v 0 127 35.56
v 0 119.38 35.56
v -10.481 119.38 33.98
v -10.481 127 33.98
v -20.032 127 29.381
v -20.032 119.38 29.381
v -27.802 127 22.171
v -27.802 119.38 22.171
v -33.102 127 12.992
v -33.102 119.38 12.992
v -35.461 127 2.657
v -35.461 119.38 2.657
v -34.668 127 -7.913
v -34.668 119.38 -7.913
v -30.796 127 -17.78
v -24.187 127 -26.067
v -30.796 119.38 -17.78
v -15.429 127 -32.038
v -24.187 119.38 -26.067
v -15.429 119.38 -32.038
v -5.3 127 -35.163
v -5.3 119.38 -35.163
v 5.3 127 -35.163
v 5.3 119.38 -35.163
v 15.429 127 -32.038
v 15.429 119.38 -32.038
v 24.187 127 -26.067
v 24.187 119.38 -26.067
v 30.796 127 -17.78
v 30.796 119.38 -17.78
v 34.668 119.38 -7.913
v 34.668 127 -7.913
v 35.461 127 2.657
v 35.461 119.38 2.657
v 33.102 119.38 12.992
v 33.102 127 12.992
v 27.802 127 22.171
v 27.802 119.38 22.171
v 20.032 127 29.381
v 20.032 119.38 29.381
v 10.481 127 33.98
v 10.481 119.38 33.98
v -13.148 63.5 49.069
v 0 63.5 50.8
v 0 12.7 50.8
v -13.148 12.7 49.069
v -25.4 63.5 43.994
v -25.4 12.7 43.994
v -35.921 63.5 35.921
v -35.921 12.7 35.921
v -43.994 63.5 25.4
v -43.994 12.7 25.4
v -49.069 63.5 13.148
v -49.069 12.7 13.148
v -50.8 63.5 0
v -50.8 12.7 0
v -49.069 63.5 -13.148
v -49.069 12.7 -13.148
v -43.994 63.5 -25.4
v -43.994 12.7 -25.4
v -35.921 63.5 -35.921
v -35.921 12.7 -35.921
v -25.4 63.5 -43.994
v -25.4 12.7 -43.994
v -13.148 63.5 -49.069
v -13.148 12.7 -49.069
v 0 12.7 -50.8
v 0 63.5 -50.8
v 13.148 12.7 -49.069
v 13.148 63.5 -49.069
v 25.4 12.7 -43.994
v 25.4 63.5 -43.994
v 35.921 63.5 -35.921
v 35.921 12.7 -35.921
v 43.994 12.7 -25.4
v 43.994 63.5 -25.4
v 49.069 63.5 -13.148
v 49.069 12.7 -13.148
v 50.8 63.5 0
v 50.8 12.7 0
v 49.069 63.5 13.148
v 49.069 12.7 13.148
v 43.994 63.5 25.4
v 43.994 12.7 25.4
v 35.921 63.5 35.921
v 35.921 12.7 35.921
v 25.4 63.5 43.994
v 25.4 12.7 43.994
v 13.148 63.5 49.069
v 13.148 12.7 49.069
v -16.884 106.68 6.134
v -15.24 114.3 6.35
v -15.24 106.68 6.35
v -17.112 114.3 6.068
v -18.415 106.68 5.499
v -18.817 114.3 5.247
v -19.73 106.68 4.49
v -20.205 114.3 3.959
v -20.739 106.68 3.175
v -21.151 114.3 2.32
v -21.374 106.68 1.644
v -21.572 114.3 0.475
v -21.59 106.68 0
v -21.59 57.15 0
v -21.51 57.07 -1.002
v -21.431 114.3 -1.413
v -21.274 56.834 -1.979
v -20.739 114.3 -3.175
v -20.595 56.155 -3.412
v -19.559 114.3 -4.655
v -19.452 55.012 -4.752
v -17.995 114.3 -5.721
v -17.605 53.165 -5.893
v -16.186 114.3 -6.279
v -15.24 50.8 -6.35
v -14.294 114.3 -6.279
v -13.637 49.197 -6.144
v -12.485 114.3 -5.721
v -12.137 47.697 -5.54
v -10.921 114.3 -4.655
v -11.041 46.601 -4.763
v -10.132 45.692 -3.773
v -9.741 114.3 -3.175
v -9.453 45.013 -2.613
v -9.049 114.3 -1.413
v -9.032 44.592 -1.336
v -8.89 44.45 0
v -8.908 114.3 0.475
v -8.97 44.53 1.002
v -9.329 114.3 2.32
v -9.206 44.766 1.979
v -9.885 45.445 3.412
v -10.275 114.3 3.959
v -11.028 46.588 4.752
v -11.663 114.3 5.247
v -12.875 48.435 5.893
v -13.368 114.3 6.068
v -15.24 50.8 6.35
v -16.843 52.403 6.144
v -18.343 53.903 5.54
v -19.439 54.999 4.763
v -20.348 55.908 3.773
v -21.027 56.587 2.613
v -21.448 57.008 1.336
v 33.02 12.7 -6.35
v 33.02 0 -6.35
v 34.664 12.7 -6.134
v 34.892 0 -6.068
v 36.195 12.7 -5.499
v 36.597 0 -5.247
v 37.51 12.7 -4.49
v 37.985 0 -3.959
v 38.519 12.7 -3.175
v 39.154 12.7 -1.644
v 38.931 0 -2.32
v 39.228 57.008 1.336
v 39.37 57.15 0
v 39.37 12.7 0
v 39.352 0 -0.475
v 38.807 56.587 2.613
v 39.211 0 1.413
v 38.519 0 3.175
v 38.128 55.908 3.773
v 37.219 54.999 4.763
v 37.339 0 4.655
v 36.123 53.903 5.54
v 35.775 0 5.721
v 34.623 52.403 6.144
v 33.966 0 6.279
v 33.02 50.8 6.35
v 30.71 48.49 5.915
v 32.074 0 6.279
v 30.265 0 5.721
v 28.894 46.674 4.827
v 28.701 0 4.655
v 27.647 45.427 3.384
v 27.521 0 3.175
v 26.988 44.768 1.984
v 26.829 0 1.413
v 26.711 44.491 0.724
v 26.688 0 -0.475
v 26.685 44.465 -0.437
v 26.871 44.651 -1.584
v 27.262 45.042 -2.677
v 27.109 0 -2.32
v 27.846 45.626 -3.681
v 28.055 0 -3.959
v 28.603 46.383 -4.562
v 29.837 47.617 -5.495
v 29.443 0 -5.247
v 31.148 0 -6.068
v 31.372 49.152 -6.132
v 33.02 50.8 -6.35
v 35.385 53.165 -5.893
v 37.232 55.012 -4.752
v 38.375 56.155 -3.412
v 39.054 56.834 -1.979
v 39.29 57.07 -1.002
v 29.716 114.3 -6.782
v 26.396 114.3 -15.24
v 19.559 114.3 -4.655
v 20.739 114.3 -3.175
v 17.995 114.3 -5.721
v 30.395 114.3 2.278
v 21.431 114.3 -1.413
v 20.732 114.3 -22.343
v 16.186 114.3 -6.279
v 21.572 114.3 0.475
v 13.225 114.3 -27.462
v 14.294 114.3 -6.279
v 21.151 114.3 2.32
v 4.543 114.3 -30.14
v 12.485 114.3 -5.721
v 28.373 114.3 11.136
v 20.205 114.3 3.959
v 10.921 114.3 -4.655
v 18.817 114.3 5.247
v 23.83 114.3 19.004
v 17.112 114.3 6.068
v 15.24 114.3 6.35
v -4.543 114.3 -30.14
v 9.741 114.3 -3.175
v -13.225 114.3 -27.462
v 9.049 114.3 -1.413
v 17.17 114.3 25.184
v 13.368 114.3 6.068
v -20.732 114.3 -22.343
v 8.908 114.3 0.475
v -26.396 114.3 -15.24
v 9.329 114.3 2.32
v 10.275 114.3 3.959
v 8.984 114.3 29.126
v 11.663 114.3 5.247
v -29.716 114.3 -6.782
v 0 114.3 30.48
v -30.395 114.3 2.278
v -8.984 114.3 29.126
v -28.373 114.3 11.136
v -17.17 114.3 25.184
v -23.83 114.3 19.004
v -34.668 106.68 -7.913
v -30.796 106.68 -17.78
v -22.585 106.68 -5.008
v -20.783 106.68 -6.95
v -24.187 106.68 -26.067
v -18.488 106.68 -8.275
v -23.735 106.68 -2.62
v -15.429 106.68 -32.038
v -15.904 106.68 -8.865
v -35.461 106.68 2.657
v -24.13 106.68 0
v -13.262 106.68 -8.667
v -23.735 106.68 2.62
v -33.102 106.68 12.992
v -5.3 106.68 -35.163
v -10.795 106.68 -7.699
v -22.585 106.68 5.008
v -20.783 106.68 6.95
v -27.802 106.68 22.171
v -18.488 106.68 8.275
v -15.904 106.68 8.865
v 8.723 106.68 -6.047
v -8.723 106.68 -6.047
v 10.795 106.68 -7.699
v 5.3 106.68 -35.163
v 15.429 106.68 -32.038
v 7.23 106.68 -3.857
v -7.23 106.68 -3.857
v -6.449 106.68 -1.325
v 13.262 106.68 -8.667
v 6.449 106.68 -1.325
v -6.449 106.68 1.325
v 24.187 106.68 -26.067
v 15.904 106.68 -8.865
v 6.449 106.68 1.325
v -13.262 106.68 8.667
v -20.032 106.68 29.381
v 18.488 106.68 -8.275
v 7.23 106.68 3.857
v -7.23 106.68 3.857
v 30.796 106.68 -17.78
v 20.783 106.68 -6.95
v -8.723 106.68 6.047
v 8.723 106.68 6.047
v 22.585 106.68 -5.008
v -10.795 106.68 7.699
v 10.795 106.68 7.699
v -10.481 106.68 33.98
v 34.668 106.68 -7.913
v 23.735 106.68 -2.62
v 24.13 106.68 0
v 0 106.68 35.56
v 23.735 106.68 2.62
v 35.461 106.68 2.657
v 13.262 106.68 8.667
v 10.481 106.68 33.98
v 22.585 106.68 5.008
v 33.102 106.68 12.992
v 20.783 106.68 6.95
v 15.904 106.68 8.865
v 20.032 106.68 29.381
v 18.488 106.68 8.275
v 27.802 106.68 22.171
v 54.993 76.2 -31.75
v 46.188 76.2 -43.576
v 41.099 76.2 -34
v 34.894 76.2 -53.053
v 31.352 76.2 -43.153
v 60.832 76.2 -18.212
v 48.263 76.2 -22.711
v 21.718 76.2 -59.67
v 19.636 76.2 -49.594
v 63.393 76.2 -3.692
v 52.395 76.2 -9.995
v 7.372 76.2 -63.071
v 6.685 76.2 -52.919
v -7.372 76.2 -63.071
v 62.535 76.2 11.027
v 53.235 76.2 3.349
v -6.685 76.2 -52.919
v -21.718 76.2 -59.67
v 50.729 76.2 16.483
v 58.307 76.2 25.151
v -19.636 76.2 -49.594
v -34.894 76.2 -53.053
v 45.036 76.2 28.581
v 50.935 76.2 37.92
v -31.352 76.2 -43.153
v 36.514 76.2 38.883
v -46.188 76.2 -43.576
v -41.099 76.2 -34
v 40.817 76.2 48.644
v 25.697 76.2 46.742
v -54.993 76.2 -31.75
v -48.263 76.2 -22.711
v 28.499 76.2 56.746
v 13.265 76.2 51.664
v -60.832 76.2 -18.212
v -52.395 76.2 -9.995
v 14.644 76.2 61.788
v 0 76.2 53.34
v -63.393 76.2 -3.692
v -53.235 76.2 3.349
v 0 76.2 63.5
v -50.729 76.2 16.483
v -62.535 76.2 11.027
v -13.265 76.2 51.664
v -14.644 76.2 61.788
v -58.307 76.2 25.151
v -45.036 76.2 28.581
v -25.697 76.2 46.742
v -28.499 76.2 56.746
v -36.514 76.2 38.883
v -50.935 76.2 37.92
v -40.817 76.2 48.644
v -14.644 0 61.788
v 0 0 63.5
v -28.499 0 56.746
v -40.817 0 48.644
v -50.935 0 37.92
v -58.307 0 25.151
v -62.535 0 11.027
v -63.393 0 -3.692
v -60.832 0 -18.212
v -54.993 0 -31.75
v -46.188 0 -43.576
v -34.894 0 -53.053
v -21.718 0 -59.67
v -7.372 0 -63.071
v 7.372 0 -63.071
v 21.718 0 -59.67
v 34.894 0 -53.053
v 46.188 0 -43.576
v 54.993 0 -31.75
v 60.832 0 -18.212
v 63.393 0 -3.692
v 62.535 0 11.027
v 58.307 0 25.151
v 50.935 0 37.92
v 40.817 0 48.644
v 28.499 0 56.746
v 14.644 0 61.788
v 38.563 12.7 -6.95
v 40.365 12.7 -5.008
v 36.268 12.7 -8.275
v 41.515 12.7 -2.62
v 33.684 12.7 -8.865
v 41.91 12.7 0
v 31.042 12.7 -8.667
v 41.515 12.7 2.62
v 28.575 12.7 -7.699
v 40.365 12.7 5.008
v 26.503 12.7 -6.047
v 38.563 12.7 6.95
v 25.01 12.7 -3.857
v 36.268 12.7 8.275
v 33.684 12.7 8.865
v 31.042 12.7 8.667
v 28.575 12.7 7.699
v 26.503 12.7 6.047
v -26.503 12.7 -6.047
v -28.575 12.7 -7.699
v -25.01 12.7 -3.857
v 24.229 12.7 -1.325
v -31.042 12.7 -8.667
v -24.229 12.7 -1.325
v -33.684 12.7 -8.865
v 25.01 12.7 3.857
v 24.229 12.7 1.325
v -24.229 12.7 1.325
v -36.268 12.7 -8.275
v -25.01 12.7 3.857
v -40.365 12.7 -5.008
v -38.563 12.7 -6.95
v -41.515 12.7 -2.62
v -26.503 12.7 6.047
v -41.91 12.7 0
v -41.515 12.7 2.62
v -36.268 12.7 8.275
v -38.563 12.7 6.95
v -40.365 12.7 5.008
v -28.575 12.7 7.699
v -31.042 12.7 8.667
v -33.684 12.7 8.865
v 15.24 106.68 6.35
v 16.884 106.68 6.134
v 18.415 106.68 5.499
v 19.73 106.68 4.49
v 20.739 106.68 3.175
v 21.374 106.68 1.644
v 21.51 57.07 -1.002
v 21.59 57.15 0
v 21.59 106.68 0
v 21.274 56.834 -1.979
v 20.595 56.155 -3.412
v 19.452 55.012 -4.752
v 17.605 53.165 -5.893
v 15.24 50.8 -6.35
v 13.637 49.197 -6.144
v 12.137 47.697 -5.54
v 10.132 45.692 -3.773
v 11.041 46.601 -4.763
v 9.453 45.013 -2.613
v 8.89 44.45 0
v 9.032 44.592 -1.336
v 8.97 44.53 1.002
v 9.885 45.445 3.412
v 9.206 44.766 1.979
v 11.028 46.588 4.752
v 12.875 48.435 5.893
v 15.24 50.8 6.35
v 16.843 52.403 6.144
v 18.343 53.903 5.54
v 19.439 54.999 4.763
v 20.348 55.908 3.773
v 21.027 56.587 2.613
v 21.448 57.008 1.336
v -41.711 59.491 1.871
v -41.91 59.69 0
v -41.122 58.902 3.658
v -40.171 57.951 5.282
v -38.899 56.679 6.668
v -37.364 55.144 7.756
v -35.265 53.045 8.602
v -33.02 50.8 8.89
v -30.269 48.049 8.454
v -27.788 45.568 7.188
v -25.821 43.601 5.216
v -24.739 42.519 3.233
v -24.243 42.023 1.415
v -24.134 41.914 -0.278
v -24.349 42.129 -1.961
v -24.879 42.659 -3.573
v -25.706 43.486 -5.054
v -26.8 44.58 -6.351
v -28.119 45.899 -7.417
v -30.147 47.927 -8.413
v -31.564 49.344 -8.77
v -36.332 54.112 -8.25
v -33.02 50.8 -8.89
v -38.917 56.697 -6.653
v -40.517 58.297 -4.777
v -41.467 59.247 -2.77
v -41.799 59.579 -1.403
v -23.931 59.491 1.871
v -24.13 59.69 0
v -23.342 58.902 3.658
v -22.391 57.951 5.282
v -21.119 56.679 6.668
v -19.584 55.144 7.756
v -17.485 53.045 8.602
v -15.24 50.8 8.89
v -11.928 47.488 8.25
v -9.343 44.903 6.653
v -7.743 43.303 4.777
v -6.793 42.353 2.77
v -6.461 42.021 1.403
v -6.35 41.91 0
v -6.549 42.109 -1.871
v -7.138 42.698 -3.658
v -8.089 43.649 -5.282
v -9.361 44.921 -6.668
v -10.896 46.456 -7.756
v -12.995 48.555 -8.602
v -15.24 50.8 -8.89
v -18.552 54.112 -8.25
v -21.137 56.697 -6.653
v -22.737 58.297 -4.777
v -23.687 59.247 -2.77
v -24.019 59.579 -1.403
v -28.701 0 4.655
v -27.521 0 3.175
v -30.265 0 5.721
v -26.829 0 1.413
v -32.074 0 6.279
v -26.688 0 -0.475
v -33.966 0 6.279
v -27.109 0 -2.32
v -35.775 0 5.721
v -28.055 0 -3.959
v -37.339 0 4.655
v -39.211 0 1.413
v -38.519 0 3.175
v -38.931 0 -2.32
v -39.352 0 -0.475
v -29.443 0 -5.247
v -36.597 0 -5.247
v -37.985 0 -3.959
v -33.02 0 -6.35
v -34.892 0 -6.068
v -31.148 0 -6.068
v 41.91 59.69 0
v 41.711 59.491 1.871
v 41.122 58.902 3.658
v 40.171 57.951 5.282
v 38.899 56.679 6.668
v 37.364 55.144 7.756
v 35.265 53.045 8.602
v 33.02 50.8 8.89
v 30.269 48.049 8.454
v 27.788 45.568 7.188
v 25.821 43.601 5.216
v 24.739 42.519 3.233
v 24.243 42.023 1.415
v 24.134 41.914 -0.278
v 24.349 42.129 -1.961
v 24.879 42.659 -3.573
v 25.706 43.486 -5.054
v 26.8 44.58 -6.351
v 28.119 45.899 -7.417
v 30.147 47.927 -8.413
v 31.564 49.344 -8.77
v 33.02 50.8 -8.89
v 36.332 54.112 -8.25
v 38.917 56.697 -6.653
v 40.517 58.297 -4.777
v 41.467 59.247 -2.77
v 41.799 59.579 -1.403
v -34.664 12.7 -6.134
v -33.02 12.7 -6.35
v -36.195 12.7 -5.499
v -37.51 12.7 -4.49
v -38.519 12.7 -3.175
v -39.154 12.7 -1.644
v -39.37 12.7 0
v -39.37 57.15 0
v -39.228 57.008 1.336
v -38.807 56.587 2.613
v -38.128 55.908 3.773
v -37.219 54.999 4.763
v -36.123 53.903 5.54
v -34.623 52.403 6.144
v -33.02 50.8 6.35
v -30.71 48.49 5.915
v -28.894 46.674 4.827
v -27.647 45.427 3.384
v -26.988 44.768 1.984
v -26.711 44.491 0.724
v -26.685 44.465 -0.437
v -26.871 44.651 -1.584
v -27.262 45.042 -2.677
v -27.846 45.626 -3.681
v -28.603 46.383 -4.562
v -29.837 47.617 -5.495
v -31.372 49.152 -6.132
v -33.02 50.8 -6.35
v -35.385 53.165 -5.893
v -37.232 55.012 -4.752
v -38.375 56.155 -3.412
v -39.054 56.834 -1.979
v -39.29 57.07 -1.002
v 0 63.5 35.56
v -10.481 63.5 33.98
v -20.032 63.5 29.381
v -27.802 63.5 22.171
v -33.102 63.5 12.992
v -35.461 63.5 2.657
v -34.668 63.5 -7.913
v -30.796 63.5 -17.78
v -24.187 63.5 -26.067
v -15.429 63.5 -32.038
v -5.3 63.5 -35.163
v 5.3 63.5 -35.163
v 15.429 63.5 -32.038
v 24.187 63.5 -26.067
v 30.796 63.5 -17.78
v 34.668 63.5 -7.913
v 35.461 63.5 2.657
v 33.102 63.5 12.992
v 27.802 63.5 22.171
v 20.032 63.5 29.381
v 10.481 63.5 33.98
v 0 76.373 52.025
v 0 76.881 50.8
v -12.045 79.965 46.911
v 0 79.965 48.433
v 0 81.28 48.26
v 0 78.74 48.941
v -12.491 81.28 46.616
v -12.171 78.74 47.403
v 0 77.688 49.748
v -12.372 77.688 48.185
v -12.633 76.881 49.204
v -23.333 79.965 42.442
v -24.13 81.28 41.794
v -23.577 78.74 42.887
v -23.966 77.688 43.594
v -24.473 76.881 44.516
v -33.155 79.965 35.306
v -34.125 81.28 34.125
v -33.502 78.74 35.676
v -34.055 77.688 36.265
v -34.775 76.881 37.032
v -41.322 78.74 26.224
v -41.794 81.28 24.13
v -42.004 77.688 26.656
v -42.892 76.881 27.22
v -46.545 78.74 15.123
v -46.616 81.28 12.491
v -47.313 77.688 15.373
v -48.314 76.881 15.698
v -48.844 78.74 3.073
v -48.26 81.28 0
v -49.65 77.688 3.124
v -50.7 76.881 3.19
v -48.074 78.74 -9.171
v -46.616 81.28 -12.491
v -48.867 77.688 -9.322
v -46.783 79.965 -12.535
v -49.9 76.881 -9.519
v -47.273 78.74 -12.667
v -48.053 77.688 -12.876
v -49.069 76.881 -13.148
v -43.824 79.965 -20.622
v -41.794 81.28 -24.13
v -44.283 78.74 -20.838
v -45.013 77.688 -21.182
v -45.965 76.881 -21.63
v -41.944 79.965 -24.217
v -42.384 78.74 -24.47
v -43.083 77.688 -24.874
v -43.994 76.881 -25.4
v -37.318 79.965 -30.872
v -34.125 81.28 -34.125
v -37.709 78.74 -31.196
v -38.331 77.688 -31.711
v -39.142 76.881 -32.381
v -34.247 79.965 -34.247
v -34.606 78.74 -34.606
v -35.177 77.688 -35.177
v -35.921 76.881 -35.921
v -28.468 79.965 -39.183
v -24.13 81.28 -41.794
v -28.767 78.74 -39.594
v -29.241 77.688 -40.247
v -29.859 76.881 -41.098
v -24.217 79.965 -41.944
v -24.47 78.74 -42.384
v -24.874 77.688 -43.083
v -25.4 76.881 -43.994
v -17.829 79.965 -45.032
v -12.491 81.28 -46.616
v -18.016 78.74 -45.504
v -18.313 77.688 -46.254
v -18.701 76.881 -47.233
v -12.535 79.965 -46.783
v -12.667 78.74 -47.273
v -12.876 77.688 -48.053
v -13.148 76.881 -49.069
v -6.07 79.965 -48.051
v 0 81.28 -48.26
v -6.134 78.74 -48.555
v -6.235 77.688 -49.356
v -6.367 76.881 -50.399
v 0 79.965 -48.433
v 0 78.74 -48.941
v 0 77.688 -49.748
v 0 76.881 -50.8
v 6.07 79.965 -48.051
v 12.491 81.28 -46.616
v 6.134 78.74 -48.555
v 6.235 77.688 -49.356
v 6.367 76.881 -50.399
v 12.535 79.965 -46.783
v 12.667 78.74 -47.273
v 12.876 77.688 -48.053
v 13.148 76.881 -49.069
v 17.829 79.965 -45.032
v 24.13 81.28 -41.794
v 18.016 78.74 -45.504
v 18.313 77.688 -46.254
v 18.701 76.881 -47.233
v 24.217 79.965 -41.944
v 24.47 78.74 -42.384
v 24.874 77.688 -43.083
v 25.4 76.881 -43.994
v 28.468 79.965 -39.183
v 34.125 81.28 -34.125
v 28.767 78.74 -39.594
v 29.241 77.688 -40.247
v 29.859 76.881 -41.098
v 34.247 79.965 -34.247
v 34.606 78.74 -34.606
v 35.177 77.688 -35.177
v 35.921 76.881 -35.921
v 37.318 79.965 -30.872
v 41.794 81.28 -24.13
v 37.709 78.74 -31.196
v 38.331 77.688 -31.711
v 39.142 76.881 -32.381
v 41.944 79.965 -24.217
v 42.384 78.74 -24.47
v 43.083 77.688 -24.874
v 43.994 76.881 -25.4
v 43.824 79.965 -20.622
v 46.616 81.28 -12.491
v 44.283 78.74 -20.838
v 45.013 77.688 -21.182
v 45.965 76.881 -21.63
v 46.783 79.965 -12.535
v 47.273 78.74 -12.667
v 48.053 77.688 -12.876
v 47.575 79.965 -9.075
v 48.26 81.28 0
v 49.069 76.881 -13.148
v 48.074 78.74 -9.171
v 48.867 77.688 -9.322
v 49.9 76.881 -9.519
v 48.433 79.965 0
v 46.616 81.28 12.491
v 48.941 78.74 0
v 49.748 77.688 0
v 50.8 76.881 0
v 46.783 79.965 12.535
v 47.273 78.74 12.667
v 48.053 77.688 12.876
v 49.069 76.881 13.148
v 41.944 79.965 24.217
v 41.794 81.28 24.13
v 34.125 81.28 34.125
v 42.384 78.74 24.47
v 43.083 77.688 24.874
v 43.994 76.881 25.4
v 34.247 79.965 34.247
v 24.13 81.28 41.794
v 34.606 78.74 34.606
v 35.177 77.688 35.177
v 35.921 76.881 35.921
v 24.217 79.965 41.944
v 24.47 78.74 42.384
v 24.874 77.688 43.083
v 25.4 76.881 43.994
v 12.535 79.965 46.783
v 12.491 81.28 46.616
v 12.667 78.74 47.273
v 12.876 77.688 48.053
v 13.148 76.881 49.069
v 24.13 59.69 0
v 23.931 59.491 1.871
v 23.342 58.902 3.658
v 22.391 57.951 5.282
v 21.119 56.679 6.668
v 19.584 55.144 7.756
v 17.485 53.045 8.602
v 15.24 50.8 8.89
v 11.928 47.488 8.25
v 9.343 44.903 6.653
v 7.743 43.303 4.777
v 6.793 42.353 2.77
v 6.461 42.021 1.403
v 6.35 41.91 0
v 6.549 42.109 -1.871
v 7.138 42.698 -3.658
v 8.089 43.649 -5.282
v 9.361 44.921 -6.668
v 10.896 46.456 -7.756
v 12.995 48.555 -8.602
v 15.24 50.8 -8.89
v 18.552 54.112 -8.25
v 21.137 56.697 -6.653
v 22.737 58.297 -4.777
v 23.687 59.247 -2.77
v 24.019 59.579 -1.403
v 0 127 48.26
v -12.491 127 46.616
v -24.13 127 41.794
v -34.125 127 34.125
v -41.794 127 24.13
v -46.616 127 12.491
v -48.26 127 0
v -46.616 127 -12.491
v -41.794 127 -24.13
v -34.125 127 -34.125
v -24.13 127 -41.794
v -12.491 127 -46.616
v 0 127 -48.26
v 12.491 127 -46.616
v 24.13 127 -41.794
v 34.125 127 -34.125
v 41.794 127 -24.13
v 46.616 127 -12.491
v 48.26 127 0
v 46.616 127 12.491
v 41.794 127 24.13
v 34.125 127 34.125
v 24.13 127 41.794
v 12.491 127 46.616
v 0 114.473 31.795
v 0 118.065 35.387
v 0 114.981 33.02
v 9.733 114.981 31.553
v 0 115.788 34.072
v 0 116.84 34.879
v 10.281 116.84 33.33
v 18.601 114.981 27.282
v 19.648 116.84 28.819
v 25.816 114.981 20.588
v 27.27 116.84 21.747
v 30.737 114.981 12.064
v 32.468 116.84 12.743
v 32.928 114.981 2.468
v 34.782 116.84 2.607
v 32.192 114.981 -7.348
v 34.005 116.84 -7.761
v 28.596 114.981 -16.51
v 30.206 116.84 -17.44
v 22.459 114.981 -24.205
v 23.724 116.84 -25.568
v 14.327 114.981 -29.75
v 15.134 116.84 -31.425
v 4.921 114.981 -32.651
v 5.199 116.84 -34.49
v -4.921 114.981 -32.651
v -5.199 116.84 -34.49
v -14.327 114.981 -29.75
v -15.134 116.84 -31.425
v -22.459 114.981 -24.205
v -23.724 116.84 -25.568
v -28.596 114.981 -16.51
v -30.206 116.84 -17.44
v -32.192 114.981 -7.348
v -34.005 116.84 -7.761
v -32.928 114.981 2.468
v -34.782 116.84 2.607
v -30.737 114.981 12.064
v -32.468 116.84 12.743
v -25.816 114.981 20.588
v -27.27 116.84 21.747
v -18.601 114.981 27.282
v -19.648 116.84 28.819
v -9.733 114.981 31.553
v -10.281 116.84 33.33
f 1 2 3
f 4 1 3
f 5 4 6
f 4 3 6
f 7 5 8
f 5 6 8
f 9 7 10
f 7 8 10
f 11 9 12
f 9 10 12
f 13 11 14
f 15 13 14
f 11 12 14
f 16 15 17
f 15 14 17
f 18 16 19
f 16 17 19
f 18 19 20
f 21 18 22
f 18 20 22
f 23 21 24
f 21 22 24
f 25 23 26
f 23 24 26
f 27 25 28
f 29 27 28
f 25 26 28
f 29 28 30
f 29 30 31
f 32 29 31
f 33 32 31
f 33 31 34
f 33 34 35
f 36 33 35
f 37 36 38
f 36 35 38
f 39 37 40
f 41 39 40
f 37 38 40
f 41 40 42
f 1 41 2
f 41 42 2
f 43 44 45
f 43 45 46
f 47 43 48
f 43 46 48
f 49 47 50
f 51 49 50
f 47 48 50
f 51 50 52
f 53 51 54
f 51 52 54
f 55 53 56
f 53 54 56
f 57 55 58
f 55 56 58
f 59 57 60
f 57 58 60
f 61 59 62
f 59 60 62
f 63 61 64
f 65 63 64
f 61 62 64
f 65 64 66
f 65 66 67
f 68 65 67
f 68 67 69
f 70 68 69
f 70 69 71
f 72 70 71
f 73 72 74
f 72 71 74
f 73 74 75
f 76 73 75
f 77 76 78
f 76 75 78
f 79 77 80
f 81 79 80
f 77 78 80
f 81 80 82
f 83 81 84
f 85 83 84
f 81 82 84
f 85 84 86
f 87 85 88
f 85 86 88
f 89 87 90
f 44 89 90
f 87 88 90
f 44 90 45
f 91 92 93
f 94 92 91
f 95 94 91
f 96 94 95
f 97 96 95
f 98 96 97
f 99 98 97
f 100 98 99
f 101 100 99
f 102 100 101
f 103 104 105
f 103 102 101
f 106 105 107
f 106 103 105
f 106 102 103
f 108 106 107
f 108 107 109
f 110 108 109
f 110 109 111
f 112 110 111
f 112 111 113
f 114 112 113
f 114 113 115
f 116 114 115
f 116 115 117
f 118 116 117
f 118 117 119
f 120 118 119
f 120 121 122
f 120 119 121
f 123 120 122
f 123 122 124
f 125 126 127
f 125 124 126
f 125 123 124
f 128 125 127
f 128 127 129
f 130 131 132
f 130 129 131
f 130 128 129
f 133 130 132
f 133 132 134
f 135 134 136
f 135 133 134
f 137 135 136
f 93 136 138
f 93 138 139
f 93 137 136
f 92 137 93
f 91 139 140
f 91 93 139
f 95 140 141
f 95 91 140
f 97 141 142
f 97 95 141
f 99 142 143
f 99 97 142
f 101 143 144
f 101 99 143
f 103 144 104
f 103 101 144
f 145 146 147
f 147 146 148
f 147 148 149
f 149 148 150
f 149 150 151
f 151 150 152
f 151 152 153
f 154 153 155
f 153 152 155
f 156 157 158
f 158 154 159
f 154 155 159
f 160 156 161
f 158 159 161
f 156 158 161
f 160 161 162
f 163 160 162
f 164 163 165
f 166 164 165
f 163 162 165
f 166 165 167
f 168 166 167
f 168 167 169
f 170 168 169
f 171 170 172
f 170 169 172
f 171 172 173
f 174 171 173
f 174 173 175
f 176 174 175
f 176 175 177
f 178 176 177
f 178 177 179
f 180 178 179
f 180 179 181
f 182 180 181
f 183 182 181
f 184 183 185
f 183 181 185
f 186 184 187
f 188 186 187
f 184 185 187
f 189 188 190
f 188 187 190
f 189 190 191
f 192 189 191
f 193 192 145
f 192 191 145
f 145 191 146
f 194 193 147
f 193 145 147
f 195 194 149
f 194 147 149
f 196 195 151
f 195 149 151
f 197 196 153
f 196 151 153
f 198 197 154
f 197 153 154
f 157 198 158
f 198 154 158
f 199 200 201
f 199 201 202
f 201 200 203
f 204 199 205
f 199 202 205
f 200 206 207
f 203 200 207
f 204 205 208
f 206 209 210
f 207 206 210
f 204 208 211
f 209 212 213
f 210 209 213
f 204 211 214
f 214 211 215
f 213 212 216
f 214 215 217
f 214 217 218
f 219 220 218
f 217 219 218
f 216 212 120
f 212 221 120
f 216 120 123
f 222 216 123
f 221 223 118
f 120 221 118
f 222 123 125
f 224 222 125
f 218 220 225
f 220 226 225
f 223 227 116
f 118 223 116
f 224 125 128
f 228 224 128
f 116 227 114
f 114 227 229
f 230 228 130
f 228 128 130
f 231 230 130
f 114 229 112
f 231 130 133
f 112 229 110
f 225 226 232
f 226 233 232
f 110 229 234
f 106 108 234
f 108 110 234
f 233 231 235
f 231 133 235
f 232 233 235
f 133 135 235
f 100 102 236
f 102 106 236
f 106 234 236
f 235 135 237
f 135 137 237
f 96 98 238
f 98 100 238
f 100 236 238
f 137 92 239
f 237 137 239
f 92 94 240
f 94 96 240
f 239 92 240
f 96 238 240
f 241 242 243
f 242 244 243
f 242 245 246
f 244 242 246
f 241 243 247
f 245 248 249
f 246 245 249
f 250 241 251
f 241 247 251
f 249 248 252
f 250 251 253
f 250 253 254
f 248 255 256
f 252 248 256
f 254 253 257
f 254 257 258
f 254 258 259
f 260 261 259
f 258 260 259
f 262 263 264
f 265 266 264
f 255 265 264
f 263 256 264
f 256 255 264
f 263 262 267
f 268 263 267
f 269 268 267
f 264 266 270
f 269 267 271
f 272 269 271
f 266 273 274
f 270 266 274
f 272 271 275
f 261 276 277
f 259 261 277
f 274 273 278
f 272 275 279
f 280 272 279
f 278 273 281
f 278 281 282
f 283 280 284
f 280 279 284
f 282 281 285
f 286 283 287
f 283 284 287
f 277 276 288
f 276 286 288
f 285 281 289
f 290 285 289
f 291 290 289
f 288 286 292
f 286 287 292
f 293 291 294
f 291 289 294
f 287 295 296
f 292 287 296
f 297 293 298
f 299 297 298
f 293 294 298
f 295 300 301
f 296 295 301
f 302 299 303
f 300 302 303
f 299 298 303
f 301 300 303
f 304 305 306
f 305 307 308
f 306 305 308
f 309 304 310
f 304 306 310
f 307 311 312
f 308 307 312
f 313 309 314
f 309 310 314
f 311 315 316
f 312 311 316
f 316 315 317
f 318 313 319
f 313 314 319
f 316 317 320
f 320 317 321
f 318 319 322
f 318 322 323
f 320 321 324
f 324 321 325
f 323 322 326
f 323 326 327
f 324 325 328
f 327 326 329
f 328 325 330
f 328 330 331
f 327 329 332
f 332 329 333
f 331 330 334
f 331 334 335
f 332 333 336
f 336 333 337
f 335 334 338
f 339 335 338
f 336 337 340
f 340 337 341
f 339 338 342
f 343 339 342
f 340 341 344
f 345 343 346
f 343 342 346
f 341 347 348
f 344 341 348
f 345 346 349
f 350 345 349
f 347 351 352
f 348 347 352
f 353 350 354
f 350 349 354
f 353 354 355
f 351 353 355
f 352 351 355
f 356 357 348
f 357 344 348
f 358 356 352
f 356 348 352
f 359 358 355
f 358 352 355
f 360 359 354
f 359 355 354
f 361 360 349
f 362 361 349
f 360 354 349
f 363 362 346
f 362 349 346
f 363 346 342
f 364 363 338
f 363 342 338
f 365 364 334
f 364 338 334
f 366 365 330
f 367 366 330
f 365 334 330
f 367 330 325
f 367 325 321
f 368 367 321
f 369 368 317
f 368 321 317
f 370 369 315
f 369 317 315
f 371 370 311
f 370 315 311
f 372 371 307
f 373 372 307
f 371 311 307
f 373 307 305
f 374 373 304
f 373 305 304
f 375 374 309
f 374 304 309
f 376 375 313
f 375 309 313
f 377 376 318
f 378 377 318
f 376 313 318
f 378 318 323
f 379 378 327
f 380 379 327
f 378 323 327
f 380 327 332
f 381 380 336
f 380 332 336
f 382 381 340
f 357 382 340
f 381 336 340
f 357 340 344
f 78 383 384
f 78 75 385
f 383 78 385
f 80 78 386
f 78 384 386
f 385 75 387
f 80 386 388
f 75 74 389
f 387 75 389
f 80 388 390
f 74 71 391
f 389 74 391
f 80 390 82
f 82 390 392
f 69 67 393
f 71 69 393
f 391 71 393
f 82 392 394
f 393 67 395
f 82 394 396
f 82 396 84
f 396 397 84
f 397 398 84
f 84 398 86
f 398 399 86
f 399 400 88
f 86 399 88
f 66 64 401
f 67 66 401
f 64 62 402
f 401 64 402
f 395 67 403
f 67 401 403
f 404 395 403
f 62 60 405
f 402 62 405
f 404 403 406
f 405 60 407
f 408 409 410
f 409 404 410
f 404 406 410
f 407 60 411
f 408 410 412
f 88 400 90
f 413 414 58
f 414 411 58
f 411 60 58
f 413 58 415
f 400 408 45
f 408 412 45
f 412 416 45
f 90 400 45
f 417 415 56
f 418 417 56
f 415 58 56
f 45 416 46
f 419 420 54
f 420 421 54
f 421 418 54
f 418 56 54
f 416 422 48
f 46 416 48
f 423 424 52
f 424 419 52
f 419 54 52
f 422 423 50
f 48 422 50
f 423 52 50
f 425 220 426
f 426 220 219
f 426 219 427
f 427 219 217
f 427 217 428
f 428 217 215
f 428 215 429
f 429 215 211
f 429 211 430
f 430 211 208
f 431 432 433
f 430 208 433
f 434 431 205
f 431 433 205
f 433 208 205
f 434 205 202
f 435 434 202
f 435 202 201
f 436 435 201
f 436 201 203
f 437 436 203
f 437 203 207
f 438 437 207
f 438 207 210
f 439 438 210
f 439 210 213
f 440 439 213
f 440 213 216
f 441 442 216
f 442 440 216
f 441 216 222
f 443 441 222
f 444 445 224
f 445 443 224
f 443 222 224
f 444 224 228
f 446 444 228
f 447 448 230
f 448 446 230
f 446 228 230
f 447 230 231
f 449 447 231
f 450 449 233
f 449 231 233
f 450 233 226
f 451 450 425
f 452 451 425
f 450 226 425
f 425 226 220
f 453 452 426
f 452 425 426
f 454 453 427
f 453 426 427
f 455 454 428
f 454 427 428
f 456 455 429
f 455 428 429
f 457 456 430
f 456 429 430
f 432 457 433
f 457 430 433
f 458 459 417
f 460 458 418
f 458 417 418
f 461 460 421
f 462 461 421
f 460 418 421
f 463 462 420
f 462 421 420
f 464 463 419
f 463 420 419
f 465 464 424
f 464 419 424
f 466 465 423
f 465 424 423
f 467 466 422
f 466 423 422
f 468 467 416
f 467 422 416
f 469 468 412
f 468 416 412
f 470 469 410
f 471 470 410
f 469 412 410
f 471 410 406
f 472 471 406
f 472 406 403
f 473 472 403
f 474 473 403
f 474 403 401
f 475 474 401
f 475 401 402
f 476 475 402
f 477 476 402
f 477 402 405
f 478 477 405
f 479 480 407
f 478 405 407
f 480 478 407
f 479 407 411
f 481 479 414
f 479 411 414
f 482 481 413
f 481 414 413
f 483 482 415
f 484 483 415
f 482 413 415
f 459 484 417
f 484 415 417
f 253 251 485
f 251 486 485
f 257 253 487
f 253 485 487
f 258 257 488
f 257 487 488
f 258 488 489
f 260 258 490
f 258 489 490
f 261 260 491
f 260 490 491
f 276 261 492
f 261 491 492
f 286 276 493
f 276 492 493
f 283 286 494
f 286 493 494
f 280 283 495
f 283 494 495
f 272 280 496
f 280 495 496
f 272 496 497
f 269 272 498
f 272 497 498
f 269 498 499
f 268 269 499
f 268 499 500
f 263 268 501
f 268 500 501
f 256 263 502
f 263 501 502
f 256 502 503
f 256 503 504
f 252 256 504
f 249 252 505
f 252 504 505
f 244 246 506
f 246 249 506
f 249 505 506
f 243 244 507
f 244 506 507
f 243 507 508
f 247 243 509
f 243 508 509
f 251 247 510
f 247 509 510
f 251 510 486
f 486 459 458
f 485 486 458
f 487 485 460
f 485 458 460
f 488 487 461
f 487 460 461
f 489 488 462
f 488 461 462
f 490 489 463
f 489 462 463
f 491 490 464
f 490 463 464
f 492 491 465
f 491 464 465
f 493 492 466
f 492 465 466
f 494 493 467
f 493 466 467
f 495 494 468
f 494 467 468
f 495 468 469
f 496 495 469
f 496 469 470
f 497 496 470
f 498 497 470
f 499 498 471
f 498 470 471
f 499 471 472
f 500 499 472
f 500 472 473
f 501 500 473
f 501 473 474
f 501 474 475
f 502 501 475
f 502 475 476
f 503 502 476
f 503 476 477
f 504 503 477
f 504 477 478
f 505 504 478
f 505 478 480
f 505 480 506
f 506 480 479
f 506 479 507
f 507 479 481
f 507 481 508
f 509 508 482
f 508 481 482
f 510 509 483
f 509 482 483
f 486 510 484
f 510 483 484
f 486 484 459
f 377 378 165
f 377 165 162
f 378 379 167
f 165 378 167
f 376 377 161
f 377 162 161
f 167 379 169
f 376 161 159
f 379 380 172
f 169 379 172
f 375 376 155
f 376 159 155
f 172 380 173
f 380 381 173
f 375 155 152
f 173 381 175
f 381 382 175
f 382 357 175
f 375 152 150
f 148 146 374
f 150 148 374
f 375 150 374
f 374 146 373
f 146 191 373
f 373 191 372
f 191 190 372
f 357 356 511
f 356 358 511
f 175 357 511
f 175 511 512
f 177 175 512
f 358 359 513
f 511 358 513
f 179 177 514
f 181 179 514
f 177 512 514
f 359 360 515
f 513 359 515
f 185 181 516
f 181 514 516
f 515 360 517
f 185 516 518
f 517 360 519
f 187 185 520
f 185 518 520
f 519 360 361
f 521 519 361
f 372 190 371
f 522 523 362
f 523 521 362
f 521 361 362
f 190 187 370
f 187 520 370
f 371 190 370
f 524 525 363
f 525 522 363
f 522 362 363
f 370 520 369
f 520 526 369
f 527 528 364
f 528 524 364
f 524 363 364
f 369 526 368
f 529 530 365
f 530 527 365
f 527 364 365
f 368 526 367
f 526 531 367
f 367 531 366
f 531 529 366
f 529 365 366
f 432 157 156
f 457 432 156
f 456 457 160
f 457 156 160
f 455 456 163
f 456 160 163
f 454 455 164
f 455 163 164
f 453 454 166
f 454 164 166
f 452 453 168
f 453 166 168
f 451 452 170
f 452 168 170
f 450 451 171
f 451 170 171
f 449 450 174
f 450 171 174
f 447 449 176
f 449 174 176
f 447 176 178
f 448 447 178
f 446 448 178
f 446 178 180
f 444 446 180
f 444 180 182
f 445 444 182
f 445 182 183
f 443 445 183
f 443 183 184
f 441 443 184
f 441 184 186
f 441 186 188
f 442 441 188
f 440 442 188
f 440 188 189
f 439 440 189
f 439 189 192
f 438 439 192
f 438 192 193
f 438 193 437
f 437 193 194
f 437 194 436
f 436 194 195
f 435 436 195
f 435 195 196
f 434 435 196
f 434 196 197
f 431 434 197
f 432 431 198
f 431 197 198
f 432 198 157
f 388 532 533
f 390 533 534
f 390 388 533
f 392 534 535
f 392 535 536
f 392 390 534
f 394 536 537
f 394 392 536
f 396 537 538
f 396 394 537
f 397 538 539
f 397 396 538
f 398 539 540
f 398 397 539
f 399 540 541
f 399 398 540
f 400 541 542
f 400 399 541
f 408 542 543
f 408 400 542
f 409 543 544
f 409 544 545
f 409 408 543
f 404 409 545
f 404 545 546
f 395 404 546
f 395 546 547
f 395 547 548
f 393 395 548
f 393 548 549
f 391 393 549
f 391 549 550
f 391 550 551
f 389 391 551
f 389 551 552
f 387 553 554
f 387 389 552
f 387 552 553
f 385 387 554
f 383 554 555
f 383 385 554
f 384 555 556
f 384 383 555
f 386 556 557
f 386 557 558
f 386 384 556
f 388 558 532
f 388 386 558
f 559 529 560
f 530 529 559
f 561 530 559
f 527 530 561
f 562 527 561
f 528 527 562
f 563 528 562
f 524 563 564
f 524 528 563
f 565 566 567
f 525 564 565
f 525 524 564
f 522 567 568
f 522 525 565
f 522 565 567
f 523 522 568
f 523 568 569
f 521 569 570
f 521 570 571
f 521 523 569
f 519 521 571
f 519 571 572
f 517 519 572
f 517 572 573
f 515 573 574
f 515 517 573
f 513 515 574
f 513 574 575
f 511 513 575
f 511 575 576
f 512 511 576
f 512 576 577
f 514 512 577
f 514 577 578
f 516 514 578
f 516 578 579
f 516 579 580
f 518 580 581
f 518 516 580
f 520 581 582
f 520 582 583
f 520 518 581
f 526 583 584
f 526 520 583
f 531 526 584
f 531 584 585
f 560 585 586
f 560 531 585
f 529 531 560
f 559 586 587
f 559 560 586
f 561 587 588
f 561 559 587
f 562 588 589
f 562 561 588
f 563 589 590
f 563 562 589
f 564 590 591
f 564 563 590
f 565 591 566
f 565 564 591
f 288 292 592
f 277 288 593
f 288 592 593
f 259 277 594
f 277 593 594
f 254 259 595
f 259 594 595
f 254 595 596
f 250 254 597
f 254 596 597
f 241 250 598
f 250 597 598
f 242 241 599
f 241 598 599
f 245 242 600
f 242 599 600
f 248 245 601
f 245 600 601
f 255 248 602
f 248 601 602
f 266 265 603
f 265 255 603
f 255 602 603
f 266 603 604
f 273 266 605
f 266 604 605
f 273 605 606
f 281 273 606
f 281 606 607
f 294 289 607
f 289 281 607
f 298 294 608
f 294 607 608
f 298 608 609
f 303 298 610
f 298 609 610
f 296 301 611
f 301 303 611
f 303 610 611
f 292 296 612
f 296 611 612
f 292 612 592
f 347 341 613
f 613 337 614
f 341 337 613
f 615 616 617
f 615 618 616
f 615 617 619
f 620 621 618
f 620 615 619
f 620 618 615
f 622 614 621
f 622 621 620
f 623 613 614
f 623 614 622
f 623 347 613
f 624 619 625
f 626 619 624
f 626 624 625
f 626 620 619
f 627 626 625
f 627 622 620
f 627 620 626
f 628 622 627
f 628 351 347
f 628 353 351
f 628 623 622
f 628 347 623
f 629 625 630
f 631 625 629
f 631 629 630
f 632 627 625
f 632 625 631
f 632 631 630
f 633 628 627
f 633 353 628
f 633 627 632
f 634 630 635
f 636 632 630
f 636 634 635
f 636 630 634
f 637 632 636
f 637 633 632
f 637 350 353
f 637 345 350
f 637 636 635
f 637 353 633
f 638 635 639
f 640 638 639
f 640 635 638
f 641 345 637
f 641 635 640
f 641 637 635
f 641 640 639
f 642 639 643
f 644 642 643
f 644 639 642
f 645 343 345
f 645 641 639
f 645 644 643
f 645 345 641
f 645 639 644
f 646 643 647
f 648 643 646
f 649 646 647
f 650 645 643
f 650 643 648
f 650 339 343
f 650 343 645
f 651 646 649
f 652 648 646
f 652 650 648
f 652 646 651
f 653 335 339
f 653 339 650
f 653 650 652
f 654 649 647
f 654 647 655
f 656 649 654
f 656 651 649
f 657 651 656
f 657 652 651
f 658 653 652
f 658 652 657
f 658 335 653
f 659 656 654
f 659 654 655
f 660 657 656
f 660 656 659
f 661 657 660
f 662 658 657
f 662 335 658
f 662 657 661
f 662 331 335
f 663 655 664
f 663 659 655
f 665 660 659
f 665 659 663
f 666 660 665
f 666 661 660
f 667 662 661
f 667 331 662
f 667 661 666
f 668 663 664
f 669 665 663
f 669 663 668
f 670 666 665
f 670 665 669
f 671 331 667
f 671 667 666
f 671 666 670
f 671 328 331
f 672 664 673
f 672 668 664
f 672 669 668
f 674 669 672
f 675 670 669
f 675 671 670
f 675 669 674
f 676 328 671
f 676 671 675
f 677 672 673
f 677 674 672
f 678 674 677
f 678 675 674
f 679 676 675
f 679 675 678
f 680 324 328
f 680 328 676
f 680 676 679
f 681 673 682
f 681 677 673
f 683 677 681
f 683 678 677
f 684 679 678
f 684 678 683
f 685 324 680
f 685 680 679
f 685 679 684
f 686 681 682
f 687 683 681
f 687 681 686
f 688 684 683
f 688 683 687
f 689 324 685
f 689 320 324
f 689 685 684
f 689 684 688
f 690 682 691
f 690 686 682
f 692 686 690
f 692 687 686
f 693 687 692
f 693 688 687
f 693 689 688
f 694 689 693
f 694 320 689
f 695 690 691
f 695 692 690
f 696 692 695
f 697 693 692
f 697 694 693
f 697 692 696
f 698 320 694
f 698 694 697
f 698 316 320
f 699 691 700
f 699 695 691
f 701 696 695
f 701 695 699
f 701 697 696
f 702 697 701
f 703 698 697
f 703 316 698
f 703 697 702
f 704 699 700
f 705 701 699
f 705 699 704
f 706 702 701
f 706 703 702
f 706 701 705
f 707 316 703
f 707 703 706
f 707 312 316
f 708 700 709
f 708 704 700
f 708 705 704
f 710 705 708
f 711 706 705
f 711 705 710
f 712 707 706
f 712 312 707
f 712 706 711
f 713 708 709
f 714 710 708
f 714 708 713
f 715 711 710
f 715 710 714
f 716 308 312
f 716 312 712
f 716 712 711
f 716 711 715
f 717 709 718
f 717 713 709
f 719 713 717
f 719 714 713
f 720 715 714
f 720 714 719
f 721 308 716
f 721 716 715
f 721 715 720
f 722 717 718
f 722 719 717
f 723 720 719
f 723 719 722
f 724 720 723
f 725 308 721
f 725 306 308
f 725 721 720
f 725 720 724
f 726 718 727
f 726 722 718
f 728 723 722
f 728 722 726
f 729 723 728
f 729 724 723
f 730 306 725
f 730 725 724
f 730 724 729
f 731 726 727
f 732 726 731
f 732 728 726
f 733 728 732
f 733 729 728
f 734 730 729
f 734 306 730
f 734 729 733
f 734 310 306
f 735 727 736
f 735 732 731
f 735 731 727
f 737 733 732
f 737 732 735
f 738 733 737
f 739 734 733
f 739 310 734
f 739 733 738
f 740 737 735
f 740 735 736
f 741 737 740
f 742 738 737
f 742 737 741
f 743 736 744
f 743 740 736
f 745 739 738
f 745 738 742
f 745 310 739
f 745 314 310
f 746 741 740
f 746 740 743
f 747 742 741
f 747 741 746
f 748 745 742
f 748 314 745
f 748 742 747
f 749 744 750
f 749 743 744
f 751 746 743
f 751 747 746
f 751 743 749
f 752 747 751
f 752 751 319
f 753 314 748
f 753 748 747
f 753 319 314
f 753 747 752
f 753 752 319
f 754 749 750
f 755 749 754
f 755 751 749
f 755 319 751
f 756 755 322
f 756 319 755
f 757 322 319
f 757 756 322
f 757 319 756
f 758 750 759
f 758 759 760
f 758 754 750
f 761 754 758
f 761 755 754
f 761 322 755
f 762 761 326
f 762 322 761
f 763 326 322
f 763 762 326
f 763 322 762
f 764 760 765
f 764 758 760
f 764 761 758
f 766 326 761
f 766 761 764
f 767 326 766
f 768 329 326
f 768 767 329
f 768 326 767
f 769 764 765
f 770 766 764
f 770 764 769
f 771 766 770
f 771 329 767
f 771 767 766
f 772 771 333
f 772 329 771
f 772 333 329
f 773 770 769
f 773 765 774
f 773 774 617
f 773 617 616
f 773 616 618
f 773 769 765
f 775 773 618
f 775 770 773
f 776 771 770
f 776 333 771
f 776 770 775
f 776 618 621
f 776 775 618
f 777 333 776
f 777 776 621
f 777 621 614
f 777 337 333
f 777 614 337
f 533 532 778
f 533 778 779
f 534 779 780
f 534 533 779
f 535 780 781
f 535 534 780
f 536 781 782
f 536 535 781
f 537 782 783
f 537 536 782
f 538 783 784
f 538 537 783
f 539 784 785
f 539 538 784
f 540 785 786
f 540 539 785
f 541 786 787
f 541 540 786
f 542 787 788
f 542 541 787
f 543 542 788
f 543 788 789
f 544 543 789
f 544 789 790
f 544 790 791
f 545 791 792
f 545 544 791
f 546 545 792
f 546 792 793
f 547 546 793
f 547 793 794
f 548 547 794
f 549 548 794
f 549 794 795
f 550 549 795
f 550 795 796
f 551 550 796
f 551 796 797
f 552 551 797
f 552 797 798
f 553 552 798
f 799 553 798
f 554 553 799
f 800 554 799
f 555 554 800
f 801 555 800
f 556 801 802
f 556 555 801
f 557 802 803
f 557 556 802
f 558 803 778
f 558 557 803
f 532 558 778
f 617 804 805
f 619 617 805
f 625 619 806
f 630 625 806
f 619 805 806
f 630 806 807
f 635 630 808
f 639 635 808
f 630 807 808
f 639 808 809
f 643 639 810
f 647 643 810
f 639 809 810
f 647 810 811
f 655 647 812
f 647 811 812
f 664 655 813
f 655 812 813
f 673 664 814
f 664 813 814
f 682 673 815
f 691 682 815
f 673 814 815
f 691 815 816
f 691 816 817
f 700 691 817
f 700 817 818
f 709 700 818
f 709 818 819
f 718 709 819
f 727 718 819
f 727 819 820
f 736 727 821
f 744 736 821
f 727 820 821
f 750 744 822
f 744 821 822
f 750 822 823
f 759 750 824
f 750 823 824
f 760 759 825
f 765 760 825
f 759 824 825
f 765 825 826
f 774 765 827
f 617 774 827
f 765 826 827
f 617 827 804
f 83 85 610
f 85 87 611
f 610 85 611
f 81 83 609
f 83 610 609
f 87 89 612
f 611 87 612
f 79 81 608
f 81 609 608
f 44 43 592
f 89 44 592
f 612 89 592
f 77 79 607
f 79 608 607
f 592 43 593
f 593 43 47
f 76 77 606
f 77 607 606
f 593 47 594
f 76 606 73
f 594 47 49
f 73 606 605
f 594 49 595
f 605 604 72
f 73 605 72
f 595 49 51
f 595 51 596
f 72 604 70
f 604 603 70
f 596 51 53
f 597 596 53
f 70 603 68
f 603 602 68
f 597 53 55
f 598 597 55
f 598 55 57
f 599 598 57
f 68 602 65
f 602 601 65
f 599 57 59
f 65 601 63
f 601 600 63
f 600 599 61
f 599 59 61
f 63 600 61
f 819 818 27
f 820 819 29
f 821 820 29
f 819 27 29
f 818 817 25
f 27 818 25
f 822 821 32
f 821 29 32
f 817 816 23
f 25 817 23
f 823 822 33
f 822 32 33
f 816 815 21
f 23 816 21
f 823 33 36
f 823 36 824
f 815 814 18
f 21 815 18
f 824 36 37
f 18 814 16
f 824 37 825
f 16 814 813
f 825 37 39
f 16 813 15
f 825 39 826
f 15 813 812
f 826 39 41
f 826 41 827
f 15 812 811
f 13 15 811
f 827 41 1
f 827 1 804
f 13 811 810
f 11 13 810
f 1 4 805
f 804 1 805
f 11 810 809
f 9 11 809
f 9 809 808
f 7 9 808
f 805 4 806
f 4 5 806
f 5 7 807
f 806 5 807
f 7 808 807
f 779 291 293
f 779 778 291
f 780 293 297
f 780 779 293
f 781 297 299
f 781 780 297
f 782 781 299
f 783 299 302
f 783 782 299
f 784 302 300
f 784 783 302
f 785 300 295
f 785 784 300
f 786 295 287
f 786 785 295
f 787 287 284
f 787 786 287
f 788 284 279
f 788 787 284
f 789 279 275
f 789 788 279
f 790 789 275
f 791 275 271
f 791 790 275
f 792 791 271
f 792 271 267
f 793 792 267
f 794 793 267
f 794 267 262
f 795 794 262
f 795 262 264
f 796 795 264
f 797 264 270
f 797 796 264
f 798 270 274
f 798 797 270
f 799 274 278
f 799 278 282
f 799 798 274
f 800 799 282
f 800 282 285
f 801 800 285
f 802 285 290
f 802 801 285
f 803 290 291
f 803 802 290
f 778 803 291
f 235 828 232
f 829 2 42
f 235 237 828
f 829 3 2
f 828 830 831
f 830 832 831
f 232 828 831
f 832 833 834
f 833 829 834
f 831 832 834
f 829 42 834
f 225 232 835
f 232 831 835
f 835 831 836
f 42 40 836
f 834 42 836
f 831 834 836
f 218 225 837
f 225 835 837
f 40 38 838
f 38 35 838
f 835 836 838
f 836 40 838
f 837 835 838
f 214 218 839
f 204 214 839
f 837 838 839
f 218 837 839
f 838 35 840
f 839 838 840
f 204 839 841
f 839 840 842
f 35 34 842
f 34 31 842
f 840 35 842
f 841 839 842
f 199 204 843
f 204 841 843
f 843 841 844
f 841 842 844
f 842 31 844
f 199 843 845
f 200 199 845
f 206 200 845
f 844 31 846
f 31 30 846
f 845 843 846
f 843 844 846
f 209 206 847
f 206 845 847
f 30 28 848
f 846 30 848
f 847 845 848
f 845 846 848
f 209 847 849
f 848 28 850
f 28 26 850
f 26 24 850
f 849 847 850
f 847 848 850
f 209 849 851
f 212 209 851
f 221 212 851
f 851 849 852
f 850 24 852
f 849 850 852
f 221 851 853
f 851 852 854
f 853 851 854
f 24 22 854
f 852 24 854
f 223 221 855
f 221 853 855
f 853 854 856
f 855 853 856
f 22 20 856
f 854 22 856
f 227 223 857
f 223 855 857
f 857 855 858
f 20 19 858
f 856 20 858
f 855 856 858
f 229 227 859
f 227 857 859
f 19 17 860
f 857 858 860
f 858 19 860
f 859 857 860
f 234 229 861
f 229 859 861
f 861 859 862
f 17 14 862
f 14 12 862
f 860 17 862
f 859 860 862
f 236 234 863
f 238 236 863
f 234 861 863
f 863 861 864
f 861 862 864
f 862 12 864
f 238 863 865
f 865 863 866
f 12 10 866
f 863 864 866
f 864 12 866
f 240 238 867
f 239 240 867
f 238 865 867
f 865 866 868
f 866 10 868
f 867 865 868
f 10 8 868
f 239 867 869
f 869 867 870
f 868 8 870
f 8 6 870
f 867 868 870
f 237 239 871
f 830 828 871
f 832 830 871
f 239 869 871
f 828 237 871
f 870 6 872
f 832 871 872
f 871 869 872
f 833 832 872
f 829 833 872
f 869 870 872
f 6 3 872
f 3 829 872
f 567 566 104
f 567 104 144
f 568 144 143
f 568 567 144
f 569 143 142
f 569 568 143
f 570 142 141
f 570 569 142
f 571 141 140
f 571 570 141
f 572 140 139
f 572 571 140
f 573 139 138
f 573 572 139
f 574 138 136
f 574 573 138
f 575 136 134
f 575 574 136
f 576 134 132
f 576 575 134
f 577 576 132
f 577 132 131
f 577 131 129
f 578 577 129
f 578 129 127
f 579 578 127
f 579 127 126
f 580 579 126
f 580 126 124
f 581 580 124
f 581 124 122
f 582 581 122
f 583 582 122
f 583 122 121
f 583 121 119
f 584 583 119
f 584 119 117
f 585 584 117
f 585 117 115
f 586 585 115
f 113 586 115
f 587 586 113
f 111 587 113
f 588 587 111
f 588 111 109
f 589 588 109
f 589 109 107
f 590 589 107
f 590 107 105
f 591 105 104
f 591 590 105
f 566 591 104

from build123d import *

# Parameters (mm, degrees)
BOSS_EXTRUDE1_START = -7.62
SKETCH2_R           = 35.56
BOSS_EXTRUDE1_DEPTH = 7.62
SKETCH4_R           = 8.89
SKETCH4_R_2         = 6.35
CUT_EXTRUDE1_REACH  = 157.543
SKETCH7_R           = 6.35
CUT_EXTRUDE2_REACH  = 147.358
SKETCH8_R           = 6.35
FILLET1_R           = 5.08


with BuildPart() as part:
    # Sketch1 → Revolve2 (revolve)
    with BuildSketch(Plane.XY, mode=Mode.PRIVATE) as revolve2_sk:
        Polygon((0, 0), (63.5, 0), (63.5, 76.2), (48.26, 76.2), (48.26, 127), (35.56, 127), (35.56, 63.5), (50.8, 63.5), (50.8, 12.7), (0, 12.7), align=None)
    revolve(revolve2_sk.sketch.rotate(Axis((0, 12.7, 0), (0, -1, 0)), 90), axis=Axis((0, 12.7, 0), (0, -1, 0)))

    # Sketch2 → Boss-Extrude1 (add)
    with BuildSketch(Plane(origin=(0, 114.3, 0), x_dir=(1, 0, 0), z_dir=(0, 1, 0)).offset(BOSS_EXTRUDE1_START)):
        with Locations(Location((0, 0, 0), (0, 0, 270))):
            Circle(SKETCH2_R)
    extrude(amount=BOSS_EXTRUDE1_DEPTH)

    # Sweep1: sweep along a path in Sketch5
    with BuildLine(Plane.XY) as sweep1_path:
        Line((15.24, 114.3), (15.24, 50.8))
        Line((15.24, 50.8), (33.02, 50.8))
        Line((33.02, 50.8), (33.02, 0))
    # Sketch4 → Sweep1 (sweep)
    with BuildSketch(Plane(origin=(0, 114.3, 0), x_dir=(1, 0, 0), z_dir=(0, 1, 0))):
        with Locations((15.24, 0)):
            Circle(SKETCH4_R)
        with Locations((15.24, 0)):
            Circle(SKETCH4_R_2, mode=Mode.SUBTRACT)
    sweep1 = sweep(path=sweep1_path.line, transition=Transition.RIGHT)

    # Sketch7 → Cut-Extrude1 (cut, up to next)
    with BuildSketch(Plane.XZ, mode=Mode.PRIVATE) as cut_extrude1_sk1:
        with Locations(Location((33.02, 0, 0), (0, 0, 270))):
            Circle(SKETCH7_R)
    cut_extrude1_tool1 = extrude(cut_extrude1_sk1.sketch, amount=-CUT_EXTRUDE1_REACH, mode=Mode.PRIVATE) & part.part
    cut_extrude1 = cut_extrude1_tool1.solids().sort_by_distance((33.02, 0, 0))[0]
    add(cut_extrude1, mode=Mode.SUBTRACT)

    # Sketch8 → Cut-Extrude2 (cut, up to next)
    with BuildSketch(Plane(origin=(0, 114.3, 0), x_dir=(1, 0, 0), z_dir=(0, 1, 0)), mode=Mode.PRIVATE) as cut_extrude2_sk1:
        with Locations(Location((15.24, 0, 0), (0, 0, 270))):
            Circle(SKETCH8_R)
    cut_extrude2_tool1 = extrude(cut_extrude2_sk1.sketch, amount=-CUT_EXTRUDE2_REACH, mode=Mode.PRIVATE) & part.part
    cut_extrude2 = cut_extrude2_tool1.solids().sort_by_distance((15.24, 114.3, 0))[0]
    add(cut_extrude2, mode=Mode.SUBTRACT)

    # Mirror1: Sweep1, Cut-Extrude1, Cut-Extrude2 across plane
    add(sweep1.mirror(Plane(origin=(0, 0, 0), x_dir=(0, 0, 1), z_dir=(1, 0, 0))))
    add(cut_extrude1.mirror(Plane(origin=(0, 0, 0), x_dir=(0, 0, 1), z_dir=(1, 0, 0))), mode=Mode.SUBTRACT)
    add(cut_extrude2.mirror(Plane(origin=(0, 0, 0), x_dir=(0, 0, 1), z_dir=(1, 0, 0))), mode=Mode.SUBTRACT)

    # Fillet1
    fillet1_edges = [part.edges().sort_by_distance(p)[0] for p in [
        (0, 76.2, -48.26),
        (0, 114.3, -35.56),
    ]]
    fillet(fillet1_edges, radius=FILLET1_R)


solid = part.part
